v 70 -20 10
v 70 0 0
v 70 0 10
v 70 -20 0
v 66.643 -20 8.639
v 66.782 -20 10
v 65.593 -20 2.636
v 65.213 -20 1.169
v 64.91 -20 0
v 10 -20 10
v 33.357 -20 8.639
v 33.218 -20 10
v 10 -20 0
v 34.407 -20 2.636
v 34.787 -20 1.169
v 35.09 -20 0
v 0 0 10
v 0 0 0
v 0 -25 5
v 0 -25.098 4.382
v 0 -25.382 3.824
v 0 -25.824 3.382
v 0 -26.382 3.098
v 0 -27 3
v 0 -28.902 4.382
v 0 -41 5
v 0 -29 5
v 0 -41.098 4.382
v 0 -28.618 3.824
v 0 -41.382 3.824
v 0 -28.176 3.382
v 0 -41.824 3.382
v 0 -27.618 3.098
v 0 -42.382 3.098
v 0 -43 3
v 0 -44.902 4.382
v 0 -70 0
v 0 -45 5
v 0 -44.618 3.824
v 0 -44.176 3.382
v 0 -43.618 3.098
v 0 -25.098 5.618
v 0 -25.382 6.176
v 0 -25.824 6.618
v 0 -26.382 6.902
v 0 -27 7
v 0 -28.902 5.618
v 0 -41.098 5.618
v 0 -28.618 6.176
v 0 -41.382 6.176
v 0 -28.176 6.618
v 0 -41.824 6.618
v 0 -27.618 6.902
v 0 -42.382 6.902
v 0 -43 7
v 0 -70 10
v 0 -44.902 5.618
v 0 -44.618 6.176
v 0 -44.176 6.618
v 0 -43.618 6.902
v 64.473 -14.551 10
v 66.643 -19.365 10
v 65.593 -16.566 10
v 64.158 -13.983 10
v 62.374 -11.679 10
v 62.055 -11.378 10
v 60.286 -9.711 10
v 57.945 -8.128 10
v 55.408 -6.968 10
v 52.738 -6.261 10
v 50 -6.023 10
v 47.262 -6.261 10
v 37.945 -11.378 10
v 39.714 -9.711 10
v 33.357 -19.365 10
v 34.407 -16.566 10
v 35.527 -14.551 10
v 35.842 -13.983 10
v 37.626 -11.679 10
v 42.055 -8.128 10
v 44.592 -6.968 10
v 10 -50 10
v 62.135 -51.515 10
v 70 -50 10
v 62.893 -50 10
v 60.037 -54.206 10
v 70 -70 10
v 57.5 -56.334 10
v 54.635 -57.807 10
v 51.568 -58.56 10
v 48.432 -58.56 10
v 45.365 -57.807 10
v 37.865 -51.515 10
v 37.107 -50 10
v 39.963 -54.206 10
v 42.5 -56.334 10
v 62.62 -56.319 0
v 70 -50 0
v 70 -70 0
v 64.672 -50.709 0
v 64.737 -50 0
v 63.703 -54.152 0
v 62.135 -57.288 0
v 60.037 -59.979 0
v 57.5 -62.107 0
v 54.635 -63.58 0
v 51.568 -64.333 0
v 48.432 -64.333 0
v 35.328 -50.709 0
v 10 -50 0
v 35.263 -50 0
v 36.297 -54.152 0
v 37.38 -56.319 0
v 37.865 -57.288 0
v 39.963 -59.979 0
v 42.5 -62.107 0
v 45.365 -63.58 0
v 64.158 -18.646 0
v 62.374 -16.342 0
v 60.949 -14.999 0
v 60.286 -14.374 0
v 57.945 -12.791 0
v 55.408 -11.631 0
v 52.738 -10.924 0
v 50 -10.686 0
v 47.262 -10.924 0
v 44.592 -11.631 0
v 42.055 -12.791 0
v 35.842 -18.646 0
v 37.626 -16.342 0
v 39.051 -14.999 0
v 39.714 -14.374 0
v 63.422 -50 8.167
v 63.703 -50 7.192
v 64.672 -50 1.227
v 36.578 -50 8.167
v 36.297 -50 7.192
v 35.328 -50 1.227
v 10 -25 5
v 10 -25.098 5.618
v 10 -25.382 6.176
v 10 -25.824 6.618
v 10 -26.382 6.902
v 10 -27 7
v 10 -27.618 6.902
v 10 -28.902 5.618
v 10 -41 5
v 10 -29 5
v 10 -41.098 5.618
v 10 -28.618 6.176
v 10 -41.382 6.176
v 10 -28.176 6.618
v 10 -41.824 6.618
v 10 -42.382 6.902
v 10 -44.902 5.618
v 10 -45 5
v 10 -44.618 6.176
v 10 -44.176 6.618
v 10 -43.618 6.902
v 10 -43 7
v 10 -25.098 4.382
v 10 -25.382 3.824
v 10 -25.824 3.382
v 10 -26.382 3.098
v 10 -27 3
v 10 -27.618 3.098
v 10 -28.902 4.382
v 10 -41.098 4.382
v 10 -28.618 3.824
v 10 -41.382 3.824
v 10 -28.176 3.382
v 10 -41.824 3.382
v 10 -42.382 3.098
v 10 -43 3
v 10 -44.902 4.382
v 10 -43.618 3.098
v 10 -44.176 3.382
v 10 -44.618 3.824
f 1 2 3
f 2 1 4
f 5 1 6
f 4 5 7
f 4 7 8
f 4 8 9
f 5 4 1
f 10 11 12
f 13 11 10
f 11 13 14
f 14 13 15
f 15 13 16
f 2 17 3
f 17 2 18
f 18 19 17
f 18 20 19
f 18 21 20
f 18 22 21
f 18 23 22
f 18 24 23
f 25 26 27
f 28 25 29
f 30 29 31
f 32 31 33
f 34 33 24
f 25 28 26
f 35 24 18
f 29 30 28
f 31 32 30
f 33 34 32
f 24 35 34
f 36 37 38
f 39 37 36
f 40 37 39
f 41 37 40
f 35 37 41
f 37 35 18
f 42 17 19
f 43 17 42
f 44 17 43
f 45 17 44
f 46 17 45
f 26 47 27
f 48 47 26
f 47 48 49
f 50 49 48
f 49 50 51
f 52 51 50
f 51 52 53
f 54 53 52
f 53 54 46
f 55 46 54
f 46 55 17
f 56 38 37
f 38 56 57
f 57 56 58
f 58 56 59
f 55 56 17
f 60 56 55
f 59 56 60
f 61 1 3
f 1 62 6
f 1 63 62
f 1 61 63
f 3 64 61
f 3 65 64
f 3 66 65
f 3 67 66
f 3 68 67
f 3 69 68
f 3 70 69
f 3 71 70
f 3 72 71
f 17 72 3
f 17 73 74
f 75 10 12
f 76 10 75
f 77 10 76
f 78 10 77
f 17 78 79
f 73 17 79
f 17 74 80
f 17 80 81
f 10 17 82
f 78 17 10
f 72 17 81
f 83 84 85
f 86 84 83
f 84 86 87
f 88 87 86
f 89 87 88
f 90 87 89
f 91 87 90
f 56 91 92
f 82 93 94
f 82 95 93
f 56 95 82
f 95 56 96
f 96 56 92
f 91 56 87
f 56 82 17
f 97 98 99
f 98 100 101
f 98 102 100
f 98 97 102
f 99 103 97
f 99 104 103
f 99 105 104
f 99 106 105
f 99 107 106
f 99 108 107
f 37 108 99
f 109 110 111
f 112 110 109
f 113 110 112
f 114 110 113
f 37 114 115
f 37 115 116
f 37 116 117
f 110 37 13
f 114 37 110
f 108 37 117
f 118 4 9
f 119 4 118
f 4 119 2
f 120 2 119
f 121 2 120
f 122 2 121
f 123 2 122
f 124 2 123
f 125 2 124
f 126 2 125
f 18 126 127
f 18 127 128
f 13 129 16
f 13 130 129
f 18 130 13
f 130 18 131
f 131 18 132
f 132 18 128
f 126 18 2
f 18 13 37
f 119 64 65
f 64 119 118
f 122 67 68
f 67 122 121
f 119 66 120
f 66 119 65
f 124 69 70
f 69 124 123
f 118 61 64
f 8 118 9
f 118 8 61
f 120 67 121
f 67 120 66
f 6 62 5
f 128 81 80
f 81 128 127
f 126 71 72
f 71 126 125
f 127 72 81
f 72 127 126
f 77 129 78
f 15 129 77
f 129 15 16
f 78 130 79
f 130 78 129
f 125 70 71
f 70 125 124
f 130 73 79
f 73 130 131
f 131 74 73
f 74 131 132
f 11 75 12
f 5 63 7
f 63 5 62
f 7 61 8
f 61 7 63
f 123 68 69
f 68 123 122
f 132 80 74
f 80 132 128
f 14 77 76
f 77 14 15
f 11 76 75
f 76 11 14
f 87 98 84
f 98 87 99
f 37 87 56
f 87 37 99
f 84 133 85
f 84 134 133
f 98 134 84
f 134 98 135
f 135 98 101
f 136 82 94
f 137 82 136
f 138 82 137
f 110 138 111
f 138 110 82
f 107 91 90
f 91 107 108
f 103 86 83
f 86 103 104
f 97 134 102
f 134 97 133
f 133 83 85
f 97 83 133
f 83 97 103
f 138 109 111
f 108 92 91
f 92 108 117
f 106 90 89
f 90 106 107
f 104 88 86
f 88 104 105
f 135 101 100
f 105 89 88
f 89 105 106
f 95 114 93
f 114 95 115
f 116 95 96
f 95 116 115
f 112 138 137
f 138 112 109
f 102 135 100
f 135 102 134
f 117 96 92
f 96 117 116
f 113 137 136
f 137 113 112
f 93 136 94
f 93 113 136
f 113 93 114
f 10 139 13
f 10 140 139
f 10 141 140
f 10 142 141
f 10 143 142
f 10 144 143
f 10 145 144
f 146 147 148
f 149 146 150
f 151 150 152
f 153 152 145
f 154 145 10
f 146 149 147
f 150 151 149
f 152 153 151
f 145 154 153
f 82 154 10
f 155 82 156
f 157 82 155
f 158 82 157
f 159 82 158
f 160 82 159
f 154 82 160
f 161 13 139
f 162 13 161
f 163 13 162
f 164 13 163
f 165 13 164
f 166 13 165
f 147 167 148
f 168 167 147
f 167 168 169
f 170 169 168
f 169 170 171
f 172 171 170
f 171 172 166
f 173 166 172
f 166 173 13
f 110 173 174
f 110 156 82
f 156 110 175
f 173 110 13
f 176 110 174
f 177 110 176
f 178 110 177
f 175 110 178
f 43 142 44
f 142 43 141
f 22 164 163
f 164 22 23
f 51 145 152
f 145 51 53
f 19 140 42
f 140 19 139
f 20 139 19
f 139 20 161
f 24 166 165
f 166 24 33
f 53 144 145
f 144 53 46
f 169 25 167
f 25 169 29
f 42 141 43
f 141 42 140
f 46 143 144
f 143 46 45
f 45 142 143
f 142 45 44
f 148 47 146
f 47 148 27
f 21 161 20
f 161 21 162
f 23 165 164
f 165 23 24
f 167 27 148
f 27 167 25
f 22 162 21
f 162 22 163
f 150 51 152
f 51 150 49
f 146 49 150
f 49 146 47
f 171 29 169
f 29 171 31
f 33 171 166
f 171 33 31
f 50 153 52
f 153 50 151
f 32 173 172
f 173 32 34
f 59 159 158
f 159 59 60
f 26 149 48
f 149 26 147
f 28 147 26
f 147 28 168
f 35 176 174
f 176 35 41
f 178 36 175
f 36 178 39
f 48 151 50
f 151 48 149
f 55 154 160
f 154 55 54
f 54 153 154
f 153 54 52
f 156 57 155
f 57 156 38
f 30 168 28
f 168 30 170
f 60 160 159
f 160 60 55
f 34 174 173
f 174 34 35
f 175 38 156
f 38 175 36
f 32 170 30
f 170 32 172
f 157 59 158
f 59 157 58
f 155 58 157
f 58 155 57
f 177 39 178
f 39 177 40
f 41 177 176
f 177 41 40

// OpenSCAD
mh=50;
rotate([90,0])
{
  union() {
difference(){
  cube([70,10,20]);
  translate([50,-.01,30])
    rotate([-25,0]) rotate([-90,0]) cylinder(d=35,h=20,$fn=40);
}
translate([0,0,mh]) difference() {
  cube([70,10,20]);
  translate([50,-5.01,0])
    rotate([-30,0]) rotate([-90,0]) translate([0,0,-5]) cylinder(d=30,h=20,$fn=30);
}
difference() {
  cube([10,10,70]);
  translate([-.01,5,20+(mh-40)/2+2]) rotate([0,90]) cylinder(d=4,h=10.02,$fn=20);
  translate([-.01,5,mh-(mh-40)/2-2]) rotate([0,90]) cylinder(d=4,h=10.02,$fn=20);
}
}
}
